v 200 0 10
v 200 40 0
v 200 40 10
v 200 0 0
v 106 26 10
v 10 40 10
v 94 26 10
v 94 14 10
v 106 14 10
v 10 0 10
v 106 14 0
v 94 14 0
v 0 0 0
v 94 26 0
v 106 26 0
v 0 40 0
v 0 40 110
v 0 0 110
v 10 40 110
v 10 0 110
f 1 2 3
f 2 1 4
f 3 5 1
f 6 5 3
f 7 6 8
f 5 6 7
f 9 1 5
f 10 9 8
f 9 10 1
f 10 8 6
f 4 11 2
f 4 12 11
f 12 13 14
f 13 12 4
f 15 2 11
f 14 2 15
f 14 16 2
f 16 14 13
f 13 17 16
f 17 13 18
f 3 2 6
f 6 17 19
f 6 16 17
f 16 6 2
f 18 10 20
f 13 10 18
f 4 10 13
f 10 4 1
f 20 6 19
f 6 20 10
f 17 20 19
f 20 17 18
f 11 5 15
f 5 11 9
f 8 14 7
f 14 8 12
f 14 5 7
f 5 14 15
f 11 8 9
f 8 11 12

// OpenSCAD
$fn = 32;

// ----------------------------------------------------------------------
// Gantry bracket: 200-250 mm L bracket
// ----------------------------------------------------------------------

// --- parameters (mm) ---
base_l = 200;             // base arm length, X
arm_w = 40;               // arm width, Y
thick = 10;               // arm thickness
up_h = 100;               // vertical arm height, Z
slot_w = 12;              // adjustment slot width in the base

total_h = up_h + thick;  // overall height

difference() {
  union() {
    cube([base_l, arm_w, thick]);
    cube([thick, arm_w, total_h]);
  }
  translate([base_l / 2 - slot_w / 2, arm_w / 2 - slot_w / 2, -1])
    cube([slot_w, slot_w, thick + 2]);
}
